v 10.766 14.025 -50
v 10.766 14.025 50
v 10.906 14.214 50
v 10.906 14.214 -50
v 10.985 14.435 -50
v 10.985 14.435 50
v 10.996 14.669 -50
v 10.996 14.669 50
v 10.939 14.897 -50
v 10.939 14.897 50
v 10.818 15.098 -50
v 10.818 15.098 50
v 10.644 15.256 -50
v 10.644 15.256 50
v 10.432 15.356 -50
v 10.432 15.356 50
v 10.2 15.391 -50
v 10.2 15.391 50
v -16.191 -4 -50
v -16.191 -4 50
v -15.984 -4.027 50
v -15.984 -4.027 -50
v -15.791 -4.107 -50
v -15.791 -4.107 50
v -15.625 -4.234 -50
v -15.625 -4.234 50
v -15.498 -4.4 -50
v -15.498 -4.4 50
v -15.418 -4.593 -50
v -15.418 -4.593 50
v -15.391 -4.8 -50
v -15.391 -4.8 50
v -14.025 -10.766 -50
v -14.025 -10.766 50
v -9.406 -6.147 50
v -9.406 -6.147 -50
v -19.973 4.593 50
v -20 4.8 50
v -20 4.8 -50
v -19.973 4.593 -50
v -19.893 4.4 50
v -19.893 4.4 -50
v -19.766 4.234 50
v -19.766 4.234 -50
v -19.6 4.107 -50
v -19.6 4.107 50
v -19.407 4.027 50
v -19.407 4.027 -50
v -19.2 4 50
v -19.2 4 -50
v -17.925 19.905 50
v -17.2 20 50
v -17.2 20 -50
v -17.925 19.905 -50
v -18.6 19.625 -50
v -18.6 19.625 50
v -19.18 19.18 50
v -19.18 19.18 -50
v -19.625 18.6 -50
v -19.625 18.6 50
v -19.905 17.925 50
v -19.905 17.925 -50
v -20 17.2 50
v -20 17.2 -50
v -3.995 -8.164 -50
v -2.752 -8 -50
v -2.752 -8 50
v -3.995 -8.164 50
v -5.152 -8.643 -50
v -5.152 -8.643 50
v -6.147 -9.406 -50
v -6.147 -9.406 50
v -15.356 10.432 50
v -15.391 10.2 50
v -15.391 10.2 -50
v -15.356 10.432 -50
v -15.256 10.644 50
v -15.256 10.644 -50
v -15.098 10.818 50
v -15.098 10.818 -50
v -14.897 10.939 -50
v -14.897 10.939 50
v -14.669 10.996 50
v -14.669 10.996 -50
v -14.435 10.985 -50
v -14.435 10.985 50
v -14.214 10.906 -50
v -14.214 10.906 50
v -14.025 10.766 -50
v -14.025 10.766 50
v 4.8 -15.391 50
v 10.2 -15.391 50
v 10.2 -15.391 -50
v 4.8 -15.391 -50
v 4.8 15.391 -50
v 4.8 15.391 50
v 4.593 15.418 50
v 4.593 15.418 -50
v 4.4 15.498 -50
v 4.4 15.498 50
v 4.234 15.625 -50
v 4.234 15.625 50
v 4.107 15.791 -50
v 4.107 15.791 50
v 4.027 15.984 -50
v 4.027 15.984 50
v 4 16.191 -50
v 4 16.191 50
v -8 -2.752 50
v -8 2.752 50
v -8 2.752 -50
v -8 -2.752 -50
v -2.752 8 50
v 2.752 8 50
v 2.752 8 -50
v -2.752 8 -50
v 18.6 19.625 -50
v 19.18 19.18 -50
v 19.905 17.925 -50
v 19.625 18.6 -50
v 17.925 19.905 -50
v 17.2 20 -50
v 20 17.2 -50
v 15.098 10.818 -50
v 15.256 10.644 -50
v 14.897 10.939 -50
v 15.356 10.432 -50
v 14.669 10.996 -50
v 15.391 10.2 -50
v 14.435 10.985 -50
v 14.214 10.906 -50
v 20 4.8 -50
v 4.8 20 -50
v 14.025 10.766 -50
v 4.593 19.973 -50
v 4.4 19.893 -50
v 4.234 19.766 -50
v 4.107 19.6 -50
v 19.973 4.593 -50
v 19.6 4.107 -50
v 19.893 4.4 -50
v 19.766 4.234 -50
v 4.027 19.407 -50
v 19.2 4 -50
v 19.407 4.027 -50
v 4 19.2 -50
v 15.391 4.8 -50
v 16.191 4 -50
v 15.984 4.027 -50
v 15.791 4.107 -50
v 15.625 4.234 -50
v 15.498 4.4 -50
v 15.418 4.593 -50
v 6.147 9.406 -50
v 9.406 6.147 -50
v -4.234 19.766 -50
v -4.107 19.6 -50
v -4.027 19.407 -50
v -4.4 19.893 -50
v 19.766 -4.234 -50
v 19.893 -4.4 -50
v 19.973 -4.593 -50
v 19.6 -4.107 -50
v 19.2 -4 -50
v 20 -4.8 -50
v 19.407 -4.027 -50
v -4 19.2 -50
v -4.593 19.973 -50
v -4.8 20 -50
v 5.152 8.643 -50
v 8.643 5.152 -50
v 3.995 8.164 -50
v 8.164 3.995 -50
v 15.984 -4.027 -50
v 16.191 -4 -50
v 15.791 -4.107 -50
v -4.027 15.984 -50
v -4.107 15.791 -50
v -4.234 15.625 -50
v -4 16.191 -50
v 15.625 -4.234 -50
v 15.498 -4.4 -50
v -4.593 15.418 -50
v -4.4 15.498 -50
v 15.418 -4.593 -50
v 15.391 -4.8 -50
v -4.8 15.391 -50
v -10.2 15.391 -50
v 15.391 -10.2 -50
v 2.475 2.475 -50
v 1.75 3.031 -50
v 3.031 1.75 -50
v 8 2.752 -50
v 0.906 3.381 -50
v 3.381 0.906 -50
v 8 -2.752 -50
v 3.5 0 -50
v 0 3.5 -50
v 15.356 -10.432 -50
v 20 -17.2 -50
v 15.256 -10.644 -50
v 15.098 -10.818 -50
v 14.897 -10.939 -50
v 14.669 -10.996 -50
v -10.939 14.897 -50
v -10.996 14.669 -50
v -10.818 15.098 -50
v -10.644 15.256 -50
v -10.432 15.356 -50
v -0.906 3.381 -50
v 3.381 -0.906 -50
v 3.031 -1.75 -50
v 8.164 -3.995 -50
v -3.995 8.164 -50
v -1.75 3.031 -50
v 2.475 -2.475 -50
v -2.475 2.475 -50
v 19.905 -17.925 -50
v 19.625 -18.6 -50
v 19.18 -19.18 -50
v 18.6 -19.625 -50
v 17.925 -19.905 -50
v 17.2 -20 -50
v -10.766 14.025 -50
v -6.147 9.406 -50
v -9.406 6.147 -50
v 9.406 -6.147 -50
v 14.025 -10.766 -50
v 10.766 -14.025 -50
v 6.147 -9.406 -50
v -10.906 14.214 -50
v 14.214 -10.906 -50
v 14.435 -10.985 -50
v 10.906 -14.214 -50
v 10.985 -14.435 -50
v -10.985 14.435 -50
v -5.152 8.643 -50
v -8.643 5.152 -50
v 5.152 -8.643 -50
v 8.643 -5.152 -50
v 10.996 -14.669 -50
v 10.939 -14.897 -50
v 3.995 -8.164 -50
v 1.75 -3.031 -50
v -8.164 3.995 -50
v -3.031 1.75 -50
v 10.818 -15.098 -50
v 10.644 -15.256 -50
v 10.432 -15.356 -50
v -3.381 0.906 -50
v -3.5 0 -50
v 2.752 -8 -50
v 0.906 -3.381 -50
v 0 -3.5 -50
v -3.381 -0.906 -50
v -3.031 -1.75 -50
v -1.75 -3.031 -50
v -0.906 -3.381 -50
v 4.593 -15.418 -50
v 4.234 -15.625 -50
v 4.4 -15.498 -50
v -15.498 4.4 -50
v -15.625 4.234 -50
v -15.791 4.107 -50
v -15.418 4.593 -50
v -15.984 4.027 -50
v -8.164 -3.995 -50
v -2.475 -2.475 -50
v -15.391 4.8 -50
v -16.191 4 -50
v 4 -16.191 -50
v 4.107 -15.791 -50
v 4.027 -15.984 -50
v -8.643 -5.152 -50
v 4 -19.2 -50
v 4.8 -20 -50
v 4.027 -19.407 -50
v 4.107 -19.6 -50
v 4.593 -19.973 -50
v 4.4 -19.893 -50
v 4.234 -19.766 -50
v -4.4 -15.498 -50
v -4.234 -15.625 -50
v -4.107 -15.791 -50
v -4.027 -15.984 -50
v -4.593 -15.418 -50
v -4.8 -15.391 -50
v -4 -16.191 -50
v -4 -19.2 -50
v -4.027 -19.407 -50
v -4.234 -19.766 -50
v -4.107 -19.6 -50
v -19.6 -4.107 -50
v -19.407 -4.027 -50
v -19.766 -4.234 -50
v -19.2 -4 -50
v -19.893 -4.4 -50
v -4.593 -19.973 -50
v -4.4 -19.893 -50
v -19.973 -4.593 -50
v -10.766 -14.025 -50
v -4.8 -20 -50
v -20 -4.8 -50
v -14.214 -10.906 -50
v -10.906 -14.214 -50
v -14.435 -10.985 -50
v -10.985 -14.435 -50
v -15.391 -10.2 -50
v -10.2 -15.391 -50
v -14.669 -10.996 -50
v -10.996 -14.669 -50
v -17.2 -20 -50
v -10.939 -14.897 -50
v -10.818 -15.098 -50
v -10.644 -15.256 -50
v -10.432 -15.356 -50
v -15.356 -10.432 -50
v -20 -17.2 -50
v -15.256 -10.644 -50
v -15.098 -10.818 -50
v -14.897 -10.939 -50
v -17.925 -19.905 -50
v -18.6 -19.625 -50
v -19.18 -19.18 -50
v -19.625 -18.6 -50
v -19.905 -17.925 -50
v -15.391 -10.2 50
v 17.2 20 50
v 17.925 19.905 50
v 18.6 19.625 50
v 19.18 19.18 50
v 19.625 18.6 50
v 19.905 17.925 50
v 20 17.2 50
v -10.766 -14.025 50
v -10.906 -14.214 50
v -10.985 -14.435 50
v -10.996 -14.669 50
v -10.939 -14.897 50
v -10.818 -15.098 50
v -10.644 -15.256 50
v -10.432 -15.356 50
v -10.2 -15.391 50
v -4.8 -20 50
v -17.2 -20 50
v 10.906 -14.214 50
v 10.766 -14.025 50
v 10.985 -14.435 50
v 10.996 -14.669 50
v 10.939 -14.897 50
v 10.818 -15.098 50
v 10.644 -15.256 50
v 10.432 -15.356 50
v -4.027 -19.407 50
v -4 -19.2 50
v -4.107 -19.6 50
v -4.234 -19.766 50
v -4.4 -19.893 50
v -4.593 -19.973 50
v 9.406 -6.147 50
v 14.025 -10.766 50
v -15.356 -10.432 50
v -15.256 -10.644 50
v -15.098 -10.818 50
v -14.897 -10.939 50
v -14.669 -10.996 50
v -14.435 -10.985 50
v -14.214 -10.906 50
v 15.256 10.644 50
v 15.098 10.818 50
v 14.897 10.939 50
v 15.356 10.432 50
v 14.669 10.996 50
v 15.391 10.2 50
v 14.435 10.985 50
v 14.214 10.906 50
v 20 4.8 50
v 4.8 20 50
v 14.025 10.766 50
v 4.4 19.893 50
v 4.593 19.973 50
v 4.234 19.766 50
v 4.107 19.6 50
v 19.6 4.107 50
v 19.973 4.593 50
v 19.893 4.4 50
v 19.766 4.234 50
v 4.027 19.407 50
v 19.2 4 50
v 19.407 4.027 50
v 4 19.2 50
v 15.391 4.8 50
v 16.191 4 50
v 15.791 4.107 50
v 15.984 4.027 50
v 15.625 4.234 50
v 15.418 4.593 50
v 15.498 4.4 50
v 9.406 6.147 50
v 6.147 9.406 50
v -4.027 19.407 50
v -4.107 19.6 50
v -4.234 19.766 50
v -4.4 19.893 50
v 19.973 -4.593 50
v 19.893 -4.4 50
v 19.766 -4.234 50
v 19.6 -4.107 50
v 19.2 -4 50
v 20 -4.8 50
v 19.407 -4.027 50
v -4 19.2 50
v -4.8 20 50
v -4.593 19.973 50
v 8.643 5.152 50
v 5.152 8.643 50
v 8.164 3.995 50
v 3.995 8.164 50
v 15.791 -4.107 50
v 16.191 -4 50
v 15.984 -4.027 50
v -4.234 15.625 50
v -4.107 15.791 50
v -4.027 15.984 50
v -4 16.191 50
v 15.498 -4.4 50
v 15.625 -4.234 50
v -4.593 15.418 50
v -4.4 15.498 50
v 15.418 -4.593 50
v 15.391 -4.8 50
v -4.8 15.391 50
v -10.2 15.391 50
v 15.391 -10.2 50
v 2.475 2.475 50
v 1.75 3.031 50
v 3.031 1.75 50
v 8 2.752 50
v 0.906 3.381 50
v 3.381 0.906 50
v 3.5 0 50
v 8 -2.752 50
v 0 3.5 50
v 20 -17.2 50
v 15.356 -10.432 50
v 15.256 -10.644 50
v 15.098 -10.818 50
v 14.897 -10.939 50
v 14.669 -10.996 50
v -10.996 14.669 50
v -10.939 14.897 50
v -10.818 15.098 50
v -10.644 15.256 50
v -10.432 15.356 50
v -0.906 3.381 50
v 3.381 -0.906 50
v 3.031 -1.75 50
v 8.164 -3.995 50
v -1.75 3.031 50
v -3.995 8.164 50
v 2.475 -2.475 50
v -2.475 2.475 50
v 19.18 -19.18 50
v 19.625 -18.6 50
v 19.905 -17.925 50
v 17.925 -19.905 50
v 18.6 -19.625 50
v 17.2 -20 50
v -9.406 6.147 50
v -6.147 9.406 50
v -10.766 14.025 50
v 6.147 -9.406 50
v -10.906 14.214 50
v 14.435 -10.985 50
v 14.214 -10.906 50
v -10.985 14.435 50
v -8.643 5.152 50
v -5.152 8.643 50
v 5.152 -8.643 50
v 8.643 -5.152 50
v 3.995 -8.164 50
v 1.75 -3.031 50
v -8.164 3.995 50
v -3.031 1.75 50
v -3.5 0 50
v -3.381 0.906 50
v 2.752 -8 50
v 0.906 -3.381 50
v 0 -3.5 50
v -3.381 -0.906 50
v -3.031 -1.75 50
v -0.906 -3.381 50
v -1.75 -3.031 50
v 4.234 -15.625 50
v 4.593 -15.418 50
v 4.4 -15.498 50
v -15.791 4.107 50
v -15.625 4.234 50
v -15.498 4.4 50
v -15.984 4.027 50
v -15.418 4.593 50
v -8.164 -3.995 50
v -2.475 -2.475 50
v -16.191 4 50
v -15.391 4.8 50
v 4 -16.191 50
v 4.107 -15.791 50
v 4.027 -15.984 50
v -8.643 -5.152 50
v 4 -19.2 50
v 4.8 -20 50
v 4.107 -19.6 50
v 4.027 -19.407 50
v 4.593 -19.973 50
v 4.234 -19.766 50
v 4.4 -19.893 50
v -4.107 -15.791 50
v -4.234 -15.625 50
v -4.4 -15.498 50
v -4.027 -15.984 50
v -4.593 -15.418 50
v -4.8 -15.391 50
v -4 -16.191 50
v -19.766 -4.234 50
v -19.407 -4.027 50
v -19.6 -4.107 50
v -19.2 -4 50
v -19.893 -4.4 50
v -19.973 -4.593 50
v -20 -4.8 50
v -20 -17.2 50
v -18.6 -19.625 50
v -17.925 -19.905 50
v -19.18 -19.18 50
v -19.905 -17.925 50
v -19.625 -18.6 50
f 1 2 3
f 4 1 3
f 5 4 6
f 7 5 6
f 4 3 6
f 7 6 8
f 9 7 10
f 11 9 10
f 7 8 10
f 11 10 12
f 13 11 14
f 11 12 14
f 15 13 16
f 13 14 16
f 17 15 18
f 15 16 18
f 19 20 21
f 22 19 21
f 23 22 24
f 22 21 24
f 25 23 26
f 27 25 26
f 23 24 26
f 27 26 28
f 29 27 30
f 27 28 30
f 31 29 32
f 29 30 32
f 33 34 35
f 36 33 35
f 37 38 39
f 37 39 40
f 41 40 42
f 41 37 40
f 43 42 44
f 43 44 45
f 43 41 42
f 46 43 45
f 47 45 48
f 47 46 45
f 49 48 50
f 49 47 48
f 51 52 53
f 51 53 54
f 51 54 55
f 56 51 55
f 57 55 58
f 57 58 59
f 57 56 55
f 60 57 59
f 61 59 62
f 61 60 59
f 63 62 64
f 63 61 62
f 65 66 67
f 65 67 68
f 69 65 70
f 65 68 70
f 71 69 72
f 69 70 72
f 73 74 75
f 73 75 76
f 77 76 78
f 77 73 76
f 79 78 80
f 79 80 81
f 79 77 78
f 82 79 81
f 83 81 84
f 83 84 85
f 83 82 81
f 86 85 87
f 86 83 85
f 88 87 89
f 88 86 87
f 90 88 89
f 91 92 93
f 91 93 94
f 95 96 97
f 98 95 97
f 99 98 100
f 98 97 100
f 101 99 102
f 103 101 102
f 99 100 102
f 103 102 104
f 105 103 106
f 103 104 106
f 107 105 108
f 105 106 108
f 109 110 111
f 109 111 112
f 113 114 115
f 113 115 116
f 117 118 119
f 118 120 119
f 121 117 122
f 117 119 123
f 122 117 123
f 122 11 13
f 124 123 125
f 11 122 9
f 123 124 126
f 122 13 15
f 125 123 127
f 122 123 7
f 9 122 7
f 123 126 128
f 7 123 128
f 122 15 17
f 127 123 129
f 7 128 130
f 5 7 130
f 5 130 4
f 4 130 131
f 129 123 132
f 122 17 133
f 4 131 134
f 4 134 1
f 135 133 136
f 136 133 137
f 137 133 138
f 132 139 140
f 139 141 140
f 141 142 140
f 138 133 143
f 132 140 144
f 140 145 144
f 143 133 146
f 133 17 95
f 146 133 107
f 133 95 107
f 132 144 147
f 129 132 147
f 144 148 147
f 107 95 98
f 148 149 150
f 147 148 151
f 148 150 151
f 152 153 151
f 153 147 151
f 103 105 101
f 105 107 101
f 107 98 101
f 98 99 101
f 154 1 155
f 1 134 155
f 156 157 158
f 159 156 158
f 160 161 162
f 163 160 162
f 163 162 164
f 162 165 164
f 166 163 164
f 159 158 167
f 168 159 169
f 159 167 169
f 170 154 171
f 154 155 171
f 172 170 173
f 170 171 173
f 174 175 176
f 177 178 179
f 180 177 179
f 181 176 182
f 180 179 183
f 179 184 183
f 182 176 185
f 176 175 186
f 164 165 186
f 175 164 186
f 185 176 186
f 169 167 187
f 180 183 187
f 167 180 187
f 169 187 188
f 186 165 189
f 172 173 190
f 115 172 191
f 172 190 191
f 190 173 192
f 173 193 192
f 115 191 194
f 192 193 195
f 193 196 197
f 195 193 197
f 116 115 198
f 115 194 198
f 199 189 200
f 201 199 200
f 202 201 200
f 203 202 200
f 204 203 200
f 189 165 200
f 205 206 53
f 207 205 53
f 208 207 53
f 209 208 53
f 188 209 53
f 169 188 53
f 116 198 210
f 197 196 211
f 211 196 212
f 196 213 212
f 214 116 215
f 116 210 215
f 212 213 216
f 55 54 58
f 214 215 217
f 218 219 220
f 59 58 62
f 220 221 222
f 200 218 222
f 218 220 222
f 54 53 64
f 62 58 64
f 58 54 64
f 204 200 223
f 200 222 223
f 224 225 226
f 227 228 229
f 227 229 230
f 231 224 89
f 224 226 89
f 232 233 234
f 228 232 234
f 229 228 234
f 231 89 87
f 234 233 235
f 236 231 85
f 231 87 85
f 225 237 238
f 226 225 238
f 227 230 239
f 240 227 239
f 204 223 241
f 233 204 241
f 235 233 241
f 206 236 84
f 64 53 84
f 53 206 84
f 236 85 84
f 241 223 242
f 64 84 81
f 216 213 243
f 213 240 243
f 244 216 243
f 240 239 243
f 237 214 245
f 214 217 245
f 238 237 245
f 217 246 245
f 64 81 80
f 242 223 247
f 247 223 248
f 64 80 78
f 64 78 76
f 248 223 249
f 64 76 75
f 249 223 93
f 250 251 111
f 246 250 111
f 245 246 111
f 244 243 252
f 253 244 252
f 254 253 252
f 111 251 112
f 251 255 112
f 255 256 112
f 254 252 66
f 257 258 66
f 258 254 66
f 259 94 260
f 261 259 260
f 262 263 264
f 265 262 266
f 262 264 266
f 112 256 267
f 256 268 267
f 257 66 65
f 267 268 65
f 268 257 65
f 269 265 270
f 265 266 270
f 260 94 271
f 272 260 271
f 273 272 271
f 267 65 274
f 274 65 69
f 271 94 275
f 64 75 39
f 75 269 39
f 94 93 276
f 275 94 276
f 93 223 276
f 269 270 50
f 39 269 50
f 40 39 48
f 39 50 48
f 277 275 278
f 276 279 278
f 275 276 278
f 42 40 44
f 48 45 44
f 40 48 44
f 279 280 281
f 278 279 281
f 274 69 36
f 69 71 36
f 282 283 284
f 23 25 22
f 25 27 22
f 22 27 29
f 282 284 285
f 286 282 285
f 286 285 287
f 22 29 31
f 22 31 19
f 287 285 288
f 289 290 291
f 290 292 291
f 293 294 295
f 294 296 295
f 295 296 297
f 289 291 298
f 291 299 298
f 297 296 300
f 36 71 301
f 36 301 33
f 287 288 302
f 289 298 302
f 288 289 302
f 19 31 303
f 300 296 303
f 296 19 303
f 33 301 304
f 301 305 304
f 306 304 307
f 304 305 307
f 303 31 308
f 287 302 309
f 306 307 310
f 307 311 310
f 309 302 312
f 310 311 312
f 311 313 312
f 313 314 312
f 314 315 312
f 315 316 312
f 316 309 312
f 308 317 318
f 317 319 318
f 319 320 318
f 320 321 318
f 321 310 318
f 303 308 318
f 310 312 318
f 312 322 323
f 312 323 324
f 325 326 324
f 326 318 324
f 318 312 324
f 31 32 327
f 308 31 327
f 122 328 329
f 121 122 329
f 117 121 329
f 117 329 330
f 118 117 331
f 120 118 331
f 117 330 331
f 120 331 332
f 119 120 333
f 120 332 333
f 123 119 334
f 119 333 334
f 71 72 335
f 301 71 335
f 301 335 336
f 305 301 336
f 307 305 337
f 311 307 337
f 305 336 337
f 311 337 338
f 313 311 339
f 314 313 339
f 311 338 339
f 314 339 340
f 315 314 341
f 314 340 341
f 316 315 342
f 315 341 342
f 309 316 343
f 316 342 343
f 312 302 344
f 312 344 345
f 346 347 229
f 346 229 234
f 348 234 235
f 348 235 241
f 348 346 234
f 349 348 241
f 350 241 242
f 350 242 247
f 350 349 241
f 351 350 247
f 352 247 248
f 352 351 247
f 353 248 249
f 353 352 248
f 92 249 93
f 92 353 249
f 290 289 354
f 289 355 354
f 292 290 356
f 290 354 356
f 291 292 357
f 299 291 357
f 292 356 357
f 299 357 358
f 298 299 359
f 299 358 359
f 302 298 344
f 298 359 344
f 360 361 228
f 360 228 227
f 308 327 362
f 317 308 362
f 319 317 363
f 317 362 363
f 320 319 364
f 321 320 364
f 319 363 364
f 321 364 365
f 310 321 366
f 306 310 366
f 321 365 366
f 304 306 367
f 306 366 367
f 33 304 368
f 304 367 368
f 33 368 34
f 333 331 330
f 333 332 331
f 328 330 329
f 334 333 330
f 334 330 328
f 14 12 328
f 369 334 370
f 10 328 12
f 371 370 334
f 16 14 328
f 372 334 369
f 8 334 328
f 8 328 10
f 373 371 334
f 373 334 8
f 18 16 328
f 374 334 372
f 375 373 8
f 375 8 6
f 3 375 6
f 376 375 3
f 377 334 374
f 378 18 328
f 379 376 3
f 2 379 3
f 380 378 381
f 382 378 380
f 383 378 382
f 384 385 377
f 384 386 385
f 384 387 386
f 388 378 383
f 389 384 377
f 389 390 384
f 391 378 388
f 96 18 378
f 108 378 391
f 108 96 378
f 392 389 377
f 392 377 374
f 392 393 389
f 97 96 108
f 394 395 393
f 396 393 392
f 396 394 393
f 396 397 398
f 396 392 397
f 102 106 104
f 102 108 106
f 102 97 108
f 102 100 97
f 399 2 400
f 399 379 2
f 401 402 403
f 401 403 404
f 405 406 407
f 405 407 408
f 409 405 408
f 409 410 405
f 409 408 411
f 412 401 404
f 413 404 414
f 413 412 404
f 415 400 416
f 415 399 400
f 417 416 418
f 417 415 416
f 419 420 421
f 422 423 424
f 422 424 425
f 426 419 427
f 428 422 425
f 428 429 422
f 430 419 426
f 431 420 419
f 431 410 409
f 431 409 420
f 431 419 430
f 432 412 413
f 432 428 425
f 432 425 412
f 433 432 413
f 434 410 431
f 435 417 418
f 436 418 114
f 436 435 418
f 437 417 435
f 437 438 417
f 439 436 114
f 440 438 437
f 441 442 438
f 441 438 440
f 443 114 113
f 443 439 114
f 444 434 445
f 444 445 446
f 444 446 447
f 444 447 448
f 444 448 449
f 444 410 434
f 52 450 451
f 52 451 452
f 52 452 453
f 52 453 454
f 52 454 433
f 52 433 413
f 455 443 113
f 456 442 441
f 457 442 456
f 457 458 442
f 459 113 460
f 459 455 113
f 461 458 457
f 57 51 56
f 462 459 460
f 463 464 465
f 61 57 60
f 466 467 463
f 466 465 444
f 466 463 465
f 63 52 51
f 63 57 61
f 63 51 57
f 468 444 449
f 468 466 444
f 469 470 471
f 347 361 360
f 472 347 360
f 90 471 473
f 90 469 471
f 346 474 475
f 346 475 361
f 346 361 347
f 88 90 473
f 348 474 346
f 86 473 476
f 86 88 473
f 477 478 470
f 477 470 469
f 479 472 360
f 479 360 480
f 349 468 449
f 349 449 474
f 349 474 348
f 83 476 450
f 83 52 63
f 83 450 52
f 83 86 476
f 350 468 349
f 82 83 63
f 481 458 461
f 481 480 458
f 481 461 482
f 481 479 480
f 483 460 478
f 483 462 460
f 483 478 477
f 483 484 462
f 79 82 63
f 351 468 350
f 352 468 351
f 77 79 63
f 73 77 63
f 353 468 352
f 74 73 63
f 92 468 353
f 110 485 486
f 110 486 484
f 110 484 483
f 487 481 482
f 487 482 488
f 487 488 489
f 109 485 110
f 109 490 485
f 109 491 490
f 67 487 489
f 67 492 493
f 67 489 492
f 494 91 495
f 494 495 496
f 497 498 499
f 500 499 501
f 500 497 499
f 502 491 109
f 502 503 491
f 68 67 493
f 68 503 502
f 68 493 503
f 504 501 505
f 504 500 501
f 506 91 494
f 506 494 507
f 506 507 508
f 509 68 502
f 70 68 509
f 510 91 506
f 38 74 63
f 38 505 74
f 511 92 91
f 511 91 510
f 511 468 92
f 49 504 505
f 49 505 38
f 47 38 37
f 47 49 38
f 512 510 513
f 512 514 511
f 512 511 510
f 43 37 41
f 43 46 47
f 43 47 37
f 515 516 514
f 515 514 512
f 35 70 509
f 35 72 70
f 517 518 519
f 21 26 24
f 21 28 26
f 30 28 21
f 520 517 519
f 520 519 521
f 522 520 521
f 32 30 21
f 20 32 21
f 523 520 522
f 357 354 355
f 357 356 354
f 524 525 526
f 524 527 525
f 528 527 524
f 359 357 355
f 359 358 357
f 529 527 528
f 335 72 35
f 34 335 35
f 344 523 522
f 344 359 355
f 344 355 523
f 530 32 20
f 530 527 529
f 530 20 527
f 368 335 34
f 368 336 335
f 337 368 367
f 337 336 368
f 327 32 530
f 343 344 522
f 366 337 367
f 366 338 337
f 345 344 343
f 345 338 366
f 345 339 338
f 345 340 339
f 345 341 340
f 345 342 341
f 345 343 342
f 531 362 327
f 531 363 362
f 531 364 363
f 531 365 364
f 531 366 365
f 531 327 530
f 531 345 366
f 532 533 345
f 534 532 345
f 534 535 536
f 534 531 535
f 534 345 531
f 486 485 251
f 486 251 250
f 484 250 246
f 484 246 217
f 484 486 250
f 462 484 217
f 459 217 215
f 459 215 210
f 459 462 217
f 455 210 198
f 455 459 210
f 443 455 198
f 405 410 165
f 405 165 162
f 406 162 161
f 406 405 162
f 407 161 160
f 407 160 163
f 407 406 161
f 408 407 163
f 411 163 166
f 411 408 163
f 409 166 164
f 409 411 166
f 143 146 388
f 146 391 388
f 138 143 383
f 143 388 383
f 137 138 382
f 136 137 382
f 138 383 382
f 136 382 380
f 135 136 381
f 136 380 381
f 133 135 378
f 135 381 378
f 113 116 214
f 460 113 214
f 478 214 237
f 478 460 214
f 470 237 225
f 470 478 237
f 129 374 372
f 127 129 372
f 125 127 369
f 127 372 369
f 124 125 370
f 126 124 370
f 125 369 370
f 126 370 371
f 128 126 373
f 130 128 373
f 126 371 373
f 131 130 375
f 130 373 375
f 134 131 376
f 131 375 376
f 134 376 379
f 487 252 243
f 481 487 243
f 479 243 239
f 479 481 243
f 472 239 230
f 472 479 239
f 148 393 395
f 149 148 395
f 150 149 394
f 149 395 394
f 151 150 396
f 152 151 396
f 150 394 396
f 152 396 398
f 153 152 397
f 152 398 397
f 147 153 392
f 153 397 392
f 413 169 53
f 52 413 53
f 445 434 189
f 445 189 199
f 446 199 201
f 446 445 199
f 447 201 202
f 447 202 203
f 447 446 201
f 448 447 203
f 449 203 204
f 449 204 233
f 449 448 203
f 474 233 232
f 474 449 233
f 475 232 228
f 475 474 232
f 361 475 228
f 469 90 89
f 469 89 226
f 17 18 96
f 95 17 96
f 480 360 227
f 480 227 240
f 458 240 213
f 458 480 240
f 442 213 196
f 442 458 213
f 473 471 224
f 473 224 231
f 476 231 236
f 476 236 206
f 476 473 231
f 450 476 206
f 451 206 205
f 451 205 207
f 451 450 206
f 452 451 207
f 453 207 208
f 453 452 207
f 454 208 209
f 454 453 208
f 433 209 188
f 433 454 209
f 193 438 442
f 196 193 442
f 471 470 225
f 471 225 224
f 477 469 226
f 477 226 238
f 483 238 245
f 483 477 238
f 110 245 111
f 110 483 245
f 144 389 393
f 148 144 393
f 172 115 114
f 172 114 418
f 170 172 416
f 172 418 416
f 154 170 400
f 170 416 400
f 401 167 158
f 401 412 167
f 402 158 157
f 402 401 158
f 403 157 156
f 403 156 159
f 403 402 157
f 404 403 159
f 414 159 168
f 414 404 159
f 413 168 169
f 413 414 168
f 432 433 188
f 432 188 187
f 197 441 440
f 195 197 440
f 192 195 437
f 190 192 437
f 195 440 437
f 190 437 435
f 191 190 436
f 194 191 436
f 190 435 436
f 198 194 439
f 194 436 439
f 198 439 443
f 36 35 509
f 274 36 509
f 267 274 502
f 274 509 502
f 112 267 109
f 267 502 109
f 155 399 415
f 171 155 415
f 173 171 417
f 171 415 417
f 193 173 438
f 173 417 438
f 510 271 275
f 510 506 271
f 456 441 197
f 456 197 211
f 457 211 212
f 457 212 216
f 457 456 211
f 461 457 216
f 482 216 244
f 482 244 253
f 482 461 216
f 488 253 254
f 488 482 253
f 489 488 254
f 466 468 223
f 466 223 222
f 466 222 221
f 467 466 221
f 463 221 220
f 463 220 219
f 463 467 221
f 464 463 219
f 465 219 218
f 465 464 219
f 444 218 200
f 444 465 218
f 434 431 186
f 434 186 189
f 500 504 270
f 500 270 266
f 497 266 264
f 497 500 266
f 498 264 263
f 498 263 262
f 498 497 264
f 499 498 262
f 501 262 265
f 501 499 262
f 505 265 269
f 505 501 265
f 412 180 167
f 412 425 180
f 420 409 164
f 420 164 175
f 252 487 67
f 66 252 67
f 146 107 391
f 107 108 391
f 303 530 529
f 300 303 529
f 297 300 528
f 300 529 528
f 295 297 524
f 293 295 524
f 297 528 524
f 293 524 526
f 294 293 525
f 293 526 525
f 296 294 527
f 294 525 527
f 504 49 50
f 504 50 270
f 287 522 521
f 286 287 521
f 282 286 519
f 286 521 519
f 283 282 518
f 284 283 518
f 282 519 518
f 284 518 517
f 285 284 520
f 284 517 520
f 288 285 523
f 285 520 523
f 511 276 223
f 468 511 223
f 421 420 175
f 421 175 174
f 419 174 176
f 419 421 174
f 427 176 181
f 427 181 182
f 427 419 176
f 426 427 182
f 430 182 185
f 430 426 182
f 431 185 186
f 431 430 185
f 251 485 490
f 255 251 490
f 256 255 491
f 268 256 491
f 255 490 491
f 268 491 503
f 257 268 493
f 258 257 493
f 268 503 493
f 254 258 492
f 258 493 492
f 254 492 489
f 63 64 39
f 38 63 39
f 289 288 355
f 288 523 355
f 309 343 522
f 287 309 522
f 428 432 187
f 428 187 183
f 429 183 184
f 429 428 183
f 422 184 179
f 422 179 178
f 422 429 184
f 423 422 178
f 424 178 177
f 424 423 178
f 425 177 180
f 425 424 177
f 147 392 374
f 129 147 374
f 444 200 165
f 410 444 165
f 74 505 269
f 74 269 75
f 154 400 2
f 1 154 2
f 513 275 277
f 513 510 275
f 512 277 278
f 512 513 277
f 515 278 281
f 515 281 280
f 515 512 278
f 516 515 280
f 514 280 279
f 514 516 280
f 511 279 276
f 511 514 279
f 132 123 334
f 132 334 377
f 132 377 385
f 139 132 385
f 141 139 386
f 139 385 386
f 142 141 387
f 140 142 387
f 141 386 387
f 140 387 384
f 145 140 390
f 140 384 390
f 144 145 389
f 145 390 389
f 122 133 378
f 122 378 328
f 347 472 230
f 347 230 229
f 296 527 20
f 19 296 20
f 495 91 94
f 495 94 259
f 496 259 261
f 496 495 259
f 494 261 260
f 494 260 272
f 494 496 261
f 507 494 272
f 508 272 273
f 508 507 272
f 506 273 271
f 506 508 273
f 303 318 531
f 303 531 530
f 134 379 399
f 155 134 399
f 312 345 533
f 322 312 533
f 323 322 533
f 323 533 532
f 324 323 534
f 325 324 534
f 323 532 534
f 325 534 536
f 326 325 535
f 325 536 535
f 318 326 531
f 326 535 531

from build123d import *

# Parameters (mm, degrees)
BOSS_EXTRUDE1_DEPTH = 50


with BuildPart() as part:
    # Sketch4 → Boss-Extrude1 (new body, symmetric)
    with BuildSketch(Plane.XY):
        with BuildLine():
            Line((4.8, -20), (17.2, -20))
            ThreePointArc((17.2, -20), (19.179898987, -19.179898987), (20, -17.2))
            Line((20, -17.2), (20, -4.8))
            ThreePointArc((20, -4.8), (19.765685425, -4.234314575), (19.2, -4))
            Line((19.2, -4), (16.190663761, -4))
            ThreePointArc((16.190663761, -4), (15.624978336, -4.234314575), (15.390663761, -4.8))
            Line((15.390663761, -4.8), (15.390663761, -10.2))
            ThreePointArc((15.390663761, -10.2), (14.896810507, -10.939103626), (14.024978336, -10.765685425))
            Line((14.024978336, -10.765685425), (9.40588745, -6.146594539))
            ThreePointArc((9.40588745, -6.146594539), (8.365378244, -4.589362465), (8, -2.752481989))
            Line((8, -2.752481989), (8, 0))
            Line((8, 0), (3.5, 0))
            ThreePointArc((3.5, 0), (2.474873734, -2.474873734), (0, -3.5))
            Line((0, -3.5), (0, -8))
            Line((0, -8), (2.752481989, -8))
            ThreePointArc((2.752481989, -8), (4.589362465, -8.365378244), (6.146594539, -9.40588745))
            Line((6.146594539, -9.40588745), (10.765685425, -14.024978336))
            ThreePointArc((10.765685425, -14.024978336), (10.939103626, -14.896810507), (10.2, -15.390663761))
            Line((10.2, -15.390663761), (4.8, -15.390663761))
            ThreePointArc((4.8, -15.390663761), (4.234314575, -15.624978336), (4, -16.190663761))
            Line((4, -16.190663761), (4, -19.2))
            ThreePointArc((4, -19.2), (4.234314575, -19.765685425), (4.8, -20))
        make_face()
    extrude(amount=BOSS_EXTRUDE1_DEPTH, both=True)

    # Mirror1: part across plane


with BuildPart() as part_1:
    add(part.part)
    add(part.part.mirror(Plane(origin=(0, 0, 0), x_dir=(0, 0, 1), z_dir=(1, 0, 0))))

    # Mirror2: part across plane


with BuildPart() as part_2:
    add(part_1.part)
    add(part_1.part.mirror(Plane.ZX))


solid = part_2.part
